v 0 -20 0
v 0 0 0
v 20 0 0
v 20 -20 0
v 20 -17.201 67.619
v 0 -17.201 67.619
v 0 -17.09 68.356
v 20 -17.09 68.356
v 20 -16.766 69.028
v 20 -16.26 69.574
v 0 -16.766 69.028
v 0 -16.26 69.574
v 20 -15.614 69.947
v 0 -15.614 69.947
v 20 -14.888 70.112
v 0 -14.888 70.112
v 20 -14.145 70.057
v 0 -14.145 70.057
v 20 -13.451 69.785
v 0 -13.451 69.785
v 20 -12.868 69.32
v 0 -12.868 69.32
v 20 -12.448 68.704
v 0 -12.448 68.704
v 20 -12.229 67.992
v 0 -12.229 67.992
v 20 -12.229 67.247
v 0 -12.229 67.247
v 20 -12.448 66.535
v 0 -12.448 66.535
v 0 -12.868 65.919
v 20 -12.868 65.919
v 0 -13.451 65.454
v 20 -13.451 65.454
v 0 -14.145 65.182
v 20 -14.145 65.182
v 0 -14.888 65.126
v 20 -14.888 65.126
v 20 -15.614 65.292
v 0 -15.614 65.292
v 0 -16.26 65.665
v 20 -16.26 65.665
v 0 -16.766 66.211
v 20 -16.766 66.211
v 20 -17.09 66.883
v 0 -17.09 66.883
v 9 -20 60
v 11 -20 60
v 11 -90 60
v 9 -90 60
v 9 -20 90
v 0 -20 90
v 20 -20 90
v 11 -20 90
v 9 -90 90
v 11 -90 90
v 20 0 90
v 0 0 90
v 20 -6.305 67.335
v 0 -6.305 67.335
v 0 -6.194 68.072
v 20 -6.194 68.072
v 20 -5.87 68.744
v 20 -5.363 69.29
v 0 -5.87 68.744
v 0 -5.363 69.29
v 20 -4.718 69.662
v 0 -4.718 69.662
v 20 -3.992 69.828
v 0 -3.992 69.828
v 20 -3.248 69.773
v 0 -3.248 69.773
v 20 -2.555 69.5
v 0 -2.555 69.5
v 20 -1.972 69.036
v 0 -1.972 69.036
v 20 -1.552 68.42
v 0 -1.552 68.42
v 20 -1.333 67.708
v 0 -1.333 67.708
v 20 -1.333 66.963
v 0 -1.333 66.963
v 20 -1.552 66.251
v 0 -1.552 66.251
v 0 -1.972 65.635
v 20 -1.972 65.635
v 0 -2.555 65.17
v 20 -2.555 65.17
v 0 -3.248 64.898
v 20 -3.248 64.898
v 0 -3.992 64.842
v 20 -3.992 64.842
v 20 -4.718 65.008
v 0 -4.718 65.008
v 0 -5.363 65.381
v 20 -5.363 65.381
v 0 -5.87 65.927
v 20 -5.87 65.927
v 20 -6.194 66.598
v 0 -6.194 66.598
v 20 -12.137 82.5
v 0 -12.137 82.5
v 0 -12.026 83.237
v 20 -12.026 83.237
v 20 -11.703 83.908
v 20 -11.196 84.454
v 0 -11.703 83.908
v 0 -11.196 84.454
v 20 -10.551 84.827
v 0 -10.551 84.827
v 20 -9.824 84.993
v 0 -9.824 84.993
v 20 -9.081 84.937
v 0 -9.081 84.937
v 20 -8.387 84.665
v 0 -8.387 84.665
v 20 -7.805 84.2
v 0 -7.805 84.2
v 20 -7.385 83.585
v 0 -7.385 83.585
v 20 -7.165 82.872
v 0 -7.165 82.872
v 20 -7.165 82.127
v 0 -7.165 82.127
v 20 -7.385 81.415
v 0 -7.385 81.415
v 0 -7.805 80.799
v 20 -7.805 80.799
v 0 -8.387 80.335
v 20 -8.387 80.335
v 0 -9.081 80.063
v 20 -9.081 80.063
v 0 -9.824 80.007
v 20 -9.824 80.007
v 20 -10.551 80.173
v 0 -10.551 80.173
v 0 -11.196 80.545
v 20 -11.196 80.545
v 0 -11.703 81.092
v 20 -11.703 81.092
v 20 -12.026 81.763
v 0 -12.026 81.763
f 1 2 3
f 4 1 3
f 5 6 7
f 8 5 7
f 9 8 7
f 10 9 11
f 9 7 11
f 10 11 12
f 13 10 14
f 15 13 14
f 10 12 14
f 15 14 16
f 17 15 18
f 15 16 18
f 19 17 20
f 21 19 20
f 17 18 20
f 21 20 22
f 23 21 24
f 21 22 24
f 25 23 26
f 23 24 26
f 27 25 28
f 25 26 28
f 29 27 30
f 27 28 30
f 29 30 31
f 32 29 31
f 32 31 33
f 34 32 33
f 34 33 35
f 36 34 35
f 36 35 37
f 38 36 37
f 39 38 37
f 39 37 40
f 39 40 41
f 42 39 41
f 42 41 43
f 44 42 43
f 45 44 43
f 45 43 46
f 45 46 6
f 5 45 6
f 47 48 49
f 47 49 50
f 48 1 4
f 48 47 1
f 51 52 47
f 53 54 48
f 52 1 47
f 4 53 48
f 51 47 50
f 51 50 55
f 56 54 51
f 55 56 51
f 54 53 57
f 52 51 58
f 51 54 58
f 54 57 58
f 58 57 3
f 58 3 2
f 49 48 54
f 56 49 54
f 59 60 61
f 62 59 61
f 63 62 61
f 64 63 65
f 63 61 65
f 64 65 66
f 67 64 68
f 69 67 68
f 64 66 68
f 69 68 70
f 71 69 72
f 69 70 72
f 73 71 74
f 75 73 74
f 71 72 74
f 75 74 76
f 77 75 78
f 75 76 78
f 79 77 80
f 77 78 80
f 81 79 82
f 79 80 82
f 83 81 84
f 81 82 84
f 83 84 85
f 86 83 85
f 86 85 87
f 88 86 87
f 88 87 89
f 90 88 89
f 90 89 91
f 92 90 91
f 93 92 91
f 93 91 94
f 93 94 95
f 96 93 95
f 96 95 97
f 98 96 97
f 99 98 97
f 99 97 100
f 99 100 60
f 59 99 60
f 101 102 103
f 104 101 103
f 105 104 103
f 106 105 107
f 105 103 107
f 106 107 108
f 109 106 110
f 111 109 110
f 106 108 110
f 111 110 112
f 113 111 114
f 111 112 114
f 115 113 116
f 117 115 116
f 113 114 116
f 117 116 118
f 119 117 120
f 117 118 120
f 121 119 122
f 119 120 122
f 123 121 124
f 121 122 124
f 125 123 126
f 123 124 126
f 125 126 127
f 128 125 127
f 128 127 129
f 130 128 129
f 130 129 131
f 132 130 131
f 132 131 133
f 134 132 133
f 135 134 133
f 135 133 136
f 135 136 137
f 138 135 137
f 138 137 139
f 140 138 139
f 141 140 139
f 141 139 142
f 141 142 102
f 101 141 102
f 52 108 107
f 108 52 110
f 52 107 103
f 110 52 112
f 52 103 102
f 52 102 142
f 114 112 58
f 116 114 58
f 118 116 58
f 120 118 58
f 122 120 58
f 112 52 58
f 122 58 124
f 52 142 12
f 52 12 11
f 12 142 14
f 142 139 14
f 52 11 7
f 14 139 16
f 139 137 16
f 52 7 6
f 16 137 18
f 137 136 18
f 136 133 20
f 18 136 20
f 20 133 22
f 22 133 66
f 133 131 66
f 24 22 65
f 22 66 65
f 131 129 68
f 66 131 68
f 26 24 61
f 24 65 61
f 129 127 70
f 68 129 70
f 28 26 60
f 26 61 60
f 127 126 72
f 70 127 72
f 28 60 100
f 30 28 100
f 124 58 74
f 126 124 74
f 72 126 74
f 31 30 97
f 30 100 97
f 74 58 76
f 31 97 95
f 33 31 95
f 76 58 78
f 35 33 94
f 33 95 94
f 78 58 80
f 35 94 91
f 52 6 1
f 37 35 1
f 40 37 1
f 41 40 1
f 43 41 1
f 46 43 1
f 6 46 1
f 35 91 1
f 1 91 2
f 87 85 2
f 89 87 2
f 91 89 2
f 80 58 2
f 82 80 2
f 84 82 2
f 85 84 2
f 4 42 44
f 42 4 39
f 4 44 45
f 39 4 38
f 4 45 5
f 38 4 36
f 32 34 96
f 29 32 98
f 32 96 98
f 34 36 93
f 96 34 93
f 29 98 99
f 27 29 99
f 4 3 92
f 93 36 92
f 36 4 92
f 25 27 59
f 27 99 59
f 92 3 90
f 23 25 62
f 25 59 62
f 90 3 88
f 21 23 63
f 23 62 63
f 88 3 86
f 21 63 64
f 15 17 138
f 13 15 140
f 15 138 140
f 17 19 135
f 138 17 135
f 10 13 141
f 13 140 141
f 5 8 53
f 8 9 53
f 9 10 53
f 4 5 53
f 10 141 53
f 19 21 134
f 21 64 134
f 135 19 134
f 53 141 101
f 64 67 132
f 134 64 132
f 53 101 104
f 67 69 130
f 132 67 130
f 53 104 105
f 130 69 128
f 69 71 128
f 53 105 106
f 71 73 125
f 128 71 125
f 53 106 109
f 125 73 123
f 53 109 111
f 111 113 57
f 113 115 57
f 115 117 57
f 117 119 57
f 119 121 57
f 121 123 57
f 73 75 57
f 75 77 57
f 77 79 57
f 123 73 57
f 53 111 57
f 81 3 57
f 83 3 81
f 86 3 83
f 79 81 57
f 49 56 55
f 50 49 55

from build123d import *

# Parameters (mm, degrees)
F1_DEPTH = 20
F2_W     = 2
F2_H     = 30
F3_DEPTH = 90
F4_R     = 2.5
F5_DEPTH = 25


with BuildPart() as f1:
    # F0 (on Front) → F1 (new body)
    with BuildSketch(Plane.XZ):
        Polygon((0, 90), (0, 0), (20, 0), (20, 90), (11, 90), (11, 60), (9, 60), (9, 90), align=None)
    extrude(amount=F1_DEPTH)

    # F2 (on face) → F3 (join)
    with BuildSketch(Plane(origin=(0, 0, 0), x_dir=(-1, 0, 0), z_dir=(0, 1, 0))):
        with Locations((-10, 75)):
            Rectangle(F2_W, F2_H)
    extrude(amount=-F3_DEPTH)

    # F4 (on face) → F5 (cut)
    with BuildSketch(Plane(origin=(0, 0, 0), x_dir=(0, -1, 0), z_dir=(-1, 0, 0))):
        with Locations((9.6371909603, 82.499884069)):
            Circle(F4_R)
        with Locations((3.8047288544, 67.3352107406)):
            Circle(F4_R)
        with Locations((14.7008737549, 67.6194578409)):
            Circle(F4_R)
    extrude(amount=-F5_DEPTH, mode=Mode.SUBTRACT)


solid = f1.part
